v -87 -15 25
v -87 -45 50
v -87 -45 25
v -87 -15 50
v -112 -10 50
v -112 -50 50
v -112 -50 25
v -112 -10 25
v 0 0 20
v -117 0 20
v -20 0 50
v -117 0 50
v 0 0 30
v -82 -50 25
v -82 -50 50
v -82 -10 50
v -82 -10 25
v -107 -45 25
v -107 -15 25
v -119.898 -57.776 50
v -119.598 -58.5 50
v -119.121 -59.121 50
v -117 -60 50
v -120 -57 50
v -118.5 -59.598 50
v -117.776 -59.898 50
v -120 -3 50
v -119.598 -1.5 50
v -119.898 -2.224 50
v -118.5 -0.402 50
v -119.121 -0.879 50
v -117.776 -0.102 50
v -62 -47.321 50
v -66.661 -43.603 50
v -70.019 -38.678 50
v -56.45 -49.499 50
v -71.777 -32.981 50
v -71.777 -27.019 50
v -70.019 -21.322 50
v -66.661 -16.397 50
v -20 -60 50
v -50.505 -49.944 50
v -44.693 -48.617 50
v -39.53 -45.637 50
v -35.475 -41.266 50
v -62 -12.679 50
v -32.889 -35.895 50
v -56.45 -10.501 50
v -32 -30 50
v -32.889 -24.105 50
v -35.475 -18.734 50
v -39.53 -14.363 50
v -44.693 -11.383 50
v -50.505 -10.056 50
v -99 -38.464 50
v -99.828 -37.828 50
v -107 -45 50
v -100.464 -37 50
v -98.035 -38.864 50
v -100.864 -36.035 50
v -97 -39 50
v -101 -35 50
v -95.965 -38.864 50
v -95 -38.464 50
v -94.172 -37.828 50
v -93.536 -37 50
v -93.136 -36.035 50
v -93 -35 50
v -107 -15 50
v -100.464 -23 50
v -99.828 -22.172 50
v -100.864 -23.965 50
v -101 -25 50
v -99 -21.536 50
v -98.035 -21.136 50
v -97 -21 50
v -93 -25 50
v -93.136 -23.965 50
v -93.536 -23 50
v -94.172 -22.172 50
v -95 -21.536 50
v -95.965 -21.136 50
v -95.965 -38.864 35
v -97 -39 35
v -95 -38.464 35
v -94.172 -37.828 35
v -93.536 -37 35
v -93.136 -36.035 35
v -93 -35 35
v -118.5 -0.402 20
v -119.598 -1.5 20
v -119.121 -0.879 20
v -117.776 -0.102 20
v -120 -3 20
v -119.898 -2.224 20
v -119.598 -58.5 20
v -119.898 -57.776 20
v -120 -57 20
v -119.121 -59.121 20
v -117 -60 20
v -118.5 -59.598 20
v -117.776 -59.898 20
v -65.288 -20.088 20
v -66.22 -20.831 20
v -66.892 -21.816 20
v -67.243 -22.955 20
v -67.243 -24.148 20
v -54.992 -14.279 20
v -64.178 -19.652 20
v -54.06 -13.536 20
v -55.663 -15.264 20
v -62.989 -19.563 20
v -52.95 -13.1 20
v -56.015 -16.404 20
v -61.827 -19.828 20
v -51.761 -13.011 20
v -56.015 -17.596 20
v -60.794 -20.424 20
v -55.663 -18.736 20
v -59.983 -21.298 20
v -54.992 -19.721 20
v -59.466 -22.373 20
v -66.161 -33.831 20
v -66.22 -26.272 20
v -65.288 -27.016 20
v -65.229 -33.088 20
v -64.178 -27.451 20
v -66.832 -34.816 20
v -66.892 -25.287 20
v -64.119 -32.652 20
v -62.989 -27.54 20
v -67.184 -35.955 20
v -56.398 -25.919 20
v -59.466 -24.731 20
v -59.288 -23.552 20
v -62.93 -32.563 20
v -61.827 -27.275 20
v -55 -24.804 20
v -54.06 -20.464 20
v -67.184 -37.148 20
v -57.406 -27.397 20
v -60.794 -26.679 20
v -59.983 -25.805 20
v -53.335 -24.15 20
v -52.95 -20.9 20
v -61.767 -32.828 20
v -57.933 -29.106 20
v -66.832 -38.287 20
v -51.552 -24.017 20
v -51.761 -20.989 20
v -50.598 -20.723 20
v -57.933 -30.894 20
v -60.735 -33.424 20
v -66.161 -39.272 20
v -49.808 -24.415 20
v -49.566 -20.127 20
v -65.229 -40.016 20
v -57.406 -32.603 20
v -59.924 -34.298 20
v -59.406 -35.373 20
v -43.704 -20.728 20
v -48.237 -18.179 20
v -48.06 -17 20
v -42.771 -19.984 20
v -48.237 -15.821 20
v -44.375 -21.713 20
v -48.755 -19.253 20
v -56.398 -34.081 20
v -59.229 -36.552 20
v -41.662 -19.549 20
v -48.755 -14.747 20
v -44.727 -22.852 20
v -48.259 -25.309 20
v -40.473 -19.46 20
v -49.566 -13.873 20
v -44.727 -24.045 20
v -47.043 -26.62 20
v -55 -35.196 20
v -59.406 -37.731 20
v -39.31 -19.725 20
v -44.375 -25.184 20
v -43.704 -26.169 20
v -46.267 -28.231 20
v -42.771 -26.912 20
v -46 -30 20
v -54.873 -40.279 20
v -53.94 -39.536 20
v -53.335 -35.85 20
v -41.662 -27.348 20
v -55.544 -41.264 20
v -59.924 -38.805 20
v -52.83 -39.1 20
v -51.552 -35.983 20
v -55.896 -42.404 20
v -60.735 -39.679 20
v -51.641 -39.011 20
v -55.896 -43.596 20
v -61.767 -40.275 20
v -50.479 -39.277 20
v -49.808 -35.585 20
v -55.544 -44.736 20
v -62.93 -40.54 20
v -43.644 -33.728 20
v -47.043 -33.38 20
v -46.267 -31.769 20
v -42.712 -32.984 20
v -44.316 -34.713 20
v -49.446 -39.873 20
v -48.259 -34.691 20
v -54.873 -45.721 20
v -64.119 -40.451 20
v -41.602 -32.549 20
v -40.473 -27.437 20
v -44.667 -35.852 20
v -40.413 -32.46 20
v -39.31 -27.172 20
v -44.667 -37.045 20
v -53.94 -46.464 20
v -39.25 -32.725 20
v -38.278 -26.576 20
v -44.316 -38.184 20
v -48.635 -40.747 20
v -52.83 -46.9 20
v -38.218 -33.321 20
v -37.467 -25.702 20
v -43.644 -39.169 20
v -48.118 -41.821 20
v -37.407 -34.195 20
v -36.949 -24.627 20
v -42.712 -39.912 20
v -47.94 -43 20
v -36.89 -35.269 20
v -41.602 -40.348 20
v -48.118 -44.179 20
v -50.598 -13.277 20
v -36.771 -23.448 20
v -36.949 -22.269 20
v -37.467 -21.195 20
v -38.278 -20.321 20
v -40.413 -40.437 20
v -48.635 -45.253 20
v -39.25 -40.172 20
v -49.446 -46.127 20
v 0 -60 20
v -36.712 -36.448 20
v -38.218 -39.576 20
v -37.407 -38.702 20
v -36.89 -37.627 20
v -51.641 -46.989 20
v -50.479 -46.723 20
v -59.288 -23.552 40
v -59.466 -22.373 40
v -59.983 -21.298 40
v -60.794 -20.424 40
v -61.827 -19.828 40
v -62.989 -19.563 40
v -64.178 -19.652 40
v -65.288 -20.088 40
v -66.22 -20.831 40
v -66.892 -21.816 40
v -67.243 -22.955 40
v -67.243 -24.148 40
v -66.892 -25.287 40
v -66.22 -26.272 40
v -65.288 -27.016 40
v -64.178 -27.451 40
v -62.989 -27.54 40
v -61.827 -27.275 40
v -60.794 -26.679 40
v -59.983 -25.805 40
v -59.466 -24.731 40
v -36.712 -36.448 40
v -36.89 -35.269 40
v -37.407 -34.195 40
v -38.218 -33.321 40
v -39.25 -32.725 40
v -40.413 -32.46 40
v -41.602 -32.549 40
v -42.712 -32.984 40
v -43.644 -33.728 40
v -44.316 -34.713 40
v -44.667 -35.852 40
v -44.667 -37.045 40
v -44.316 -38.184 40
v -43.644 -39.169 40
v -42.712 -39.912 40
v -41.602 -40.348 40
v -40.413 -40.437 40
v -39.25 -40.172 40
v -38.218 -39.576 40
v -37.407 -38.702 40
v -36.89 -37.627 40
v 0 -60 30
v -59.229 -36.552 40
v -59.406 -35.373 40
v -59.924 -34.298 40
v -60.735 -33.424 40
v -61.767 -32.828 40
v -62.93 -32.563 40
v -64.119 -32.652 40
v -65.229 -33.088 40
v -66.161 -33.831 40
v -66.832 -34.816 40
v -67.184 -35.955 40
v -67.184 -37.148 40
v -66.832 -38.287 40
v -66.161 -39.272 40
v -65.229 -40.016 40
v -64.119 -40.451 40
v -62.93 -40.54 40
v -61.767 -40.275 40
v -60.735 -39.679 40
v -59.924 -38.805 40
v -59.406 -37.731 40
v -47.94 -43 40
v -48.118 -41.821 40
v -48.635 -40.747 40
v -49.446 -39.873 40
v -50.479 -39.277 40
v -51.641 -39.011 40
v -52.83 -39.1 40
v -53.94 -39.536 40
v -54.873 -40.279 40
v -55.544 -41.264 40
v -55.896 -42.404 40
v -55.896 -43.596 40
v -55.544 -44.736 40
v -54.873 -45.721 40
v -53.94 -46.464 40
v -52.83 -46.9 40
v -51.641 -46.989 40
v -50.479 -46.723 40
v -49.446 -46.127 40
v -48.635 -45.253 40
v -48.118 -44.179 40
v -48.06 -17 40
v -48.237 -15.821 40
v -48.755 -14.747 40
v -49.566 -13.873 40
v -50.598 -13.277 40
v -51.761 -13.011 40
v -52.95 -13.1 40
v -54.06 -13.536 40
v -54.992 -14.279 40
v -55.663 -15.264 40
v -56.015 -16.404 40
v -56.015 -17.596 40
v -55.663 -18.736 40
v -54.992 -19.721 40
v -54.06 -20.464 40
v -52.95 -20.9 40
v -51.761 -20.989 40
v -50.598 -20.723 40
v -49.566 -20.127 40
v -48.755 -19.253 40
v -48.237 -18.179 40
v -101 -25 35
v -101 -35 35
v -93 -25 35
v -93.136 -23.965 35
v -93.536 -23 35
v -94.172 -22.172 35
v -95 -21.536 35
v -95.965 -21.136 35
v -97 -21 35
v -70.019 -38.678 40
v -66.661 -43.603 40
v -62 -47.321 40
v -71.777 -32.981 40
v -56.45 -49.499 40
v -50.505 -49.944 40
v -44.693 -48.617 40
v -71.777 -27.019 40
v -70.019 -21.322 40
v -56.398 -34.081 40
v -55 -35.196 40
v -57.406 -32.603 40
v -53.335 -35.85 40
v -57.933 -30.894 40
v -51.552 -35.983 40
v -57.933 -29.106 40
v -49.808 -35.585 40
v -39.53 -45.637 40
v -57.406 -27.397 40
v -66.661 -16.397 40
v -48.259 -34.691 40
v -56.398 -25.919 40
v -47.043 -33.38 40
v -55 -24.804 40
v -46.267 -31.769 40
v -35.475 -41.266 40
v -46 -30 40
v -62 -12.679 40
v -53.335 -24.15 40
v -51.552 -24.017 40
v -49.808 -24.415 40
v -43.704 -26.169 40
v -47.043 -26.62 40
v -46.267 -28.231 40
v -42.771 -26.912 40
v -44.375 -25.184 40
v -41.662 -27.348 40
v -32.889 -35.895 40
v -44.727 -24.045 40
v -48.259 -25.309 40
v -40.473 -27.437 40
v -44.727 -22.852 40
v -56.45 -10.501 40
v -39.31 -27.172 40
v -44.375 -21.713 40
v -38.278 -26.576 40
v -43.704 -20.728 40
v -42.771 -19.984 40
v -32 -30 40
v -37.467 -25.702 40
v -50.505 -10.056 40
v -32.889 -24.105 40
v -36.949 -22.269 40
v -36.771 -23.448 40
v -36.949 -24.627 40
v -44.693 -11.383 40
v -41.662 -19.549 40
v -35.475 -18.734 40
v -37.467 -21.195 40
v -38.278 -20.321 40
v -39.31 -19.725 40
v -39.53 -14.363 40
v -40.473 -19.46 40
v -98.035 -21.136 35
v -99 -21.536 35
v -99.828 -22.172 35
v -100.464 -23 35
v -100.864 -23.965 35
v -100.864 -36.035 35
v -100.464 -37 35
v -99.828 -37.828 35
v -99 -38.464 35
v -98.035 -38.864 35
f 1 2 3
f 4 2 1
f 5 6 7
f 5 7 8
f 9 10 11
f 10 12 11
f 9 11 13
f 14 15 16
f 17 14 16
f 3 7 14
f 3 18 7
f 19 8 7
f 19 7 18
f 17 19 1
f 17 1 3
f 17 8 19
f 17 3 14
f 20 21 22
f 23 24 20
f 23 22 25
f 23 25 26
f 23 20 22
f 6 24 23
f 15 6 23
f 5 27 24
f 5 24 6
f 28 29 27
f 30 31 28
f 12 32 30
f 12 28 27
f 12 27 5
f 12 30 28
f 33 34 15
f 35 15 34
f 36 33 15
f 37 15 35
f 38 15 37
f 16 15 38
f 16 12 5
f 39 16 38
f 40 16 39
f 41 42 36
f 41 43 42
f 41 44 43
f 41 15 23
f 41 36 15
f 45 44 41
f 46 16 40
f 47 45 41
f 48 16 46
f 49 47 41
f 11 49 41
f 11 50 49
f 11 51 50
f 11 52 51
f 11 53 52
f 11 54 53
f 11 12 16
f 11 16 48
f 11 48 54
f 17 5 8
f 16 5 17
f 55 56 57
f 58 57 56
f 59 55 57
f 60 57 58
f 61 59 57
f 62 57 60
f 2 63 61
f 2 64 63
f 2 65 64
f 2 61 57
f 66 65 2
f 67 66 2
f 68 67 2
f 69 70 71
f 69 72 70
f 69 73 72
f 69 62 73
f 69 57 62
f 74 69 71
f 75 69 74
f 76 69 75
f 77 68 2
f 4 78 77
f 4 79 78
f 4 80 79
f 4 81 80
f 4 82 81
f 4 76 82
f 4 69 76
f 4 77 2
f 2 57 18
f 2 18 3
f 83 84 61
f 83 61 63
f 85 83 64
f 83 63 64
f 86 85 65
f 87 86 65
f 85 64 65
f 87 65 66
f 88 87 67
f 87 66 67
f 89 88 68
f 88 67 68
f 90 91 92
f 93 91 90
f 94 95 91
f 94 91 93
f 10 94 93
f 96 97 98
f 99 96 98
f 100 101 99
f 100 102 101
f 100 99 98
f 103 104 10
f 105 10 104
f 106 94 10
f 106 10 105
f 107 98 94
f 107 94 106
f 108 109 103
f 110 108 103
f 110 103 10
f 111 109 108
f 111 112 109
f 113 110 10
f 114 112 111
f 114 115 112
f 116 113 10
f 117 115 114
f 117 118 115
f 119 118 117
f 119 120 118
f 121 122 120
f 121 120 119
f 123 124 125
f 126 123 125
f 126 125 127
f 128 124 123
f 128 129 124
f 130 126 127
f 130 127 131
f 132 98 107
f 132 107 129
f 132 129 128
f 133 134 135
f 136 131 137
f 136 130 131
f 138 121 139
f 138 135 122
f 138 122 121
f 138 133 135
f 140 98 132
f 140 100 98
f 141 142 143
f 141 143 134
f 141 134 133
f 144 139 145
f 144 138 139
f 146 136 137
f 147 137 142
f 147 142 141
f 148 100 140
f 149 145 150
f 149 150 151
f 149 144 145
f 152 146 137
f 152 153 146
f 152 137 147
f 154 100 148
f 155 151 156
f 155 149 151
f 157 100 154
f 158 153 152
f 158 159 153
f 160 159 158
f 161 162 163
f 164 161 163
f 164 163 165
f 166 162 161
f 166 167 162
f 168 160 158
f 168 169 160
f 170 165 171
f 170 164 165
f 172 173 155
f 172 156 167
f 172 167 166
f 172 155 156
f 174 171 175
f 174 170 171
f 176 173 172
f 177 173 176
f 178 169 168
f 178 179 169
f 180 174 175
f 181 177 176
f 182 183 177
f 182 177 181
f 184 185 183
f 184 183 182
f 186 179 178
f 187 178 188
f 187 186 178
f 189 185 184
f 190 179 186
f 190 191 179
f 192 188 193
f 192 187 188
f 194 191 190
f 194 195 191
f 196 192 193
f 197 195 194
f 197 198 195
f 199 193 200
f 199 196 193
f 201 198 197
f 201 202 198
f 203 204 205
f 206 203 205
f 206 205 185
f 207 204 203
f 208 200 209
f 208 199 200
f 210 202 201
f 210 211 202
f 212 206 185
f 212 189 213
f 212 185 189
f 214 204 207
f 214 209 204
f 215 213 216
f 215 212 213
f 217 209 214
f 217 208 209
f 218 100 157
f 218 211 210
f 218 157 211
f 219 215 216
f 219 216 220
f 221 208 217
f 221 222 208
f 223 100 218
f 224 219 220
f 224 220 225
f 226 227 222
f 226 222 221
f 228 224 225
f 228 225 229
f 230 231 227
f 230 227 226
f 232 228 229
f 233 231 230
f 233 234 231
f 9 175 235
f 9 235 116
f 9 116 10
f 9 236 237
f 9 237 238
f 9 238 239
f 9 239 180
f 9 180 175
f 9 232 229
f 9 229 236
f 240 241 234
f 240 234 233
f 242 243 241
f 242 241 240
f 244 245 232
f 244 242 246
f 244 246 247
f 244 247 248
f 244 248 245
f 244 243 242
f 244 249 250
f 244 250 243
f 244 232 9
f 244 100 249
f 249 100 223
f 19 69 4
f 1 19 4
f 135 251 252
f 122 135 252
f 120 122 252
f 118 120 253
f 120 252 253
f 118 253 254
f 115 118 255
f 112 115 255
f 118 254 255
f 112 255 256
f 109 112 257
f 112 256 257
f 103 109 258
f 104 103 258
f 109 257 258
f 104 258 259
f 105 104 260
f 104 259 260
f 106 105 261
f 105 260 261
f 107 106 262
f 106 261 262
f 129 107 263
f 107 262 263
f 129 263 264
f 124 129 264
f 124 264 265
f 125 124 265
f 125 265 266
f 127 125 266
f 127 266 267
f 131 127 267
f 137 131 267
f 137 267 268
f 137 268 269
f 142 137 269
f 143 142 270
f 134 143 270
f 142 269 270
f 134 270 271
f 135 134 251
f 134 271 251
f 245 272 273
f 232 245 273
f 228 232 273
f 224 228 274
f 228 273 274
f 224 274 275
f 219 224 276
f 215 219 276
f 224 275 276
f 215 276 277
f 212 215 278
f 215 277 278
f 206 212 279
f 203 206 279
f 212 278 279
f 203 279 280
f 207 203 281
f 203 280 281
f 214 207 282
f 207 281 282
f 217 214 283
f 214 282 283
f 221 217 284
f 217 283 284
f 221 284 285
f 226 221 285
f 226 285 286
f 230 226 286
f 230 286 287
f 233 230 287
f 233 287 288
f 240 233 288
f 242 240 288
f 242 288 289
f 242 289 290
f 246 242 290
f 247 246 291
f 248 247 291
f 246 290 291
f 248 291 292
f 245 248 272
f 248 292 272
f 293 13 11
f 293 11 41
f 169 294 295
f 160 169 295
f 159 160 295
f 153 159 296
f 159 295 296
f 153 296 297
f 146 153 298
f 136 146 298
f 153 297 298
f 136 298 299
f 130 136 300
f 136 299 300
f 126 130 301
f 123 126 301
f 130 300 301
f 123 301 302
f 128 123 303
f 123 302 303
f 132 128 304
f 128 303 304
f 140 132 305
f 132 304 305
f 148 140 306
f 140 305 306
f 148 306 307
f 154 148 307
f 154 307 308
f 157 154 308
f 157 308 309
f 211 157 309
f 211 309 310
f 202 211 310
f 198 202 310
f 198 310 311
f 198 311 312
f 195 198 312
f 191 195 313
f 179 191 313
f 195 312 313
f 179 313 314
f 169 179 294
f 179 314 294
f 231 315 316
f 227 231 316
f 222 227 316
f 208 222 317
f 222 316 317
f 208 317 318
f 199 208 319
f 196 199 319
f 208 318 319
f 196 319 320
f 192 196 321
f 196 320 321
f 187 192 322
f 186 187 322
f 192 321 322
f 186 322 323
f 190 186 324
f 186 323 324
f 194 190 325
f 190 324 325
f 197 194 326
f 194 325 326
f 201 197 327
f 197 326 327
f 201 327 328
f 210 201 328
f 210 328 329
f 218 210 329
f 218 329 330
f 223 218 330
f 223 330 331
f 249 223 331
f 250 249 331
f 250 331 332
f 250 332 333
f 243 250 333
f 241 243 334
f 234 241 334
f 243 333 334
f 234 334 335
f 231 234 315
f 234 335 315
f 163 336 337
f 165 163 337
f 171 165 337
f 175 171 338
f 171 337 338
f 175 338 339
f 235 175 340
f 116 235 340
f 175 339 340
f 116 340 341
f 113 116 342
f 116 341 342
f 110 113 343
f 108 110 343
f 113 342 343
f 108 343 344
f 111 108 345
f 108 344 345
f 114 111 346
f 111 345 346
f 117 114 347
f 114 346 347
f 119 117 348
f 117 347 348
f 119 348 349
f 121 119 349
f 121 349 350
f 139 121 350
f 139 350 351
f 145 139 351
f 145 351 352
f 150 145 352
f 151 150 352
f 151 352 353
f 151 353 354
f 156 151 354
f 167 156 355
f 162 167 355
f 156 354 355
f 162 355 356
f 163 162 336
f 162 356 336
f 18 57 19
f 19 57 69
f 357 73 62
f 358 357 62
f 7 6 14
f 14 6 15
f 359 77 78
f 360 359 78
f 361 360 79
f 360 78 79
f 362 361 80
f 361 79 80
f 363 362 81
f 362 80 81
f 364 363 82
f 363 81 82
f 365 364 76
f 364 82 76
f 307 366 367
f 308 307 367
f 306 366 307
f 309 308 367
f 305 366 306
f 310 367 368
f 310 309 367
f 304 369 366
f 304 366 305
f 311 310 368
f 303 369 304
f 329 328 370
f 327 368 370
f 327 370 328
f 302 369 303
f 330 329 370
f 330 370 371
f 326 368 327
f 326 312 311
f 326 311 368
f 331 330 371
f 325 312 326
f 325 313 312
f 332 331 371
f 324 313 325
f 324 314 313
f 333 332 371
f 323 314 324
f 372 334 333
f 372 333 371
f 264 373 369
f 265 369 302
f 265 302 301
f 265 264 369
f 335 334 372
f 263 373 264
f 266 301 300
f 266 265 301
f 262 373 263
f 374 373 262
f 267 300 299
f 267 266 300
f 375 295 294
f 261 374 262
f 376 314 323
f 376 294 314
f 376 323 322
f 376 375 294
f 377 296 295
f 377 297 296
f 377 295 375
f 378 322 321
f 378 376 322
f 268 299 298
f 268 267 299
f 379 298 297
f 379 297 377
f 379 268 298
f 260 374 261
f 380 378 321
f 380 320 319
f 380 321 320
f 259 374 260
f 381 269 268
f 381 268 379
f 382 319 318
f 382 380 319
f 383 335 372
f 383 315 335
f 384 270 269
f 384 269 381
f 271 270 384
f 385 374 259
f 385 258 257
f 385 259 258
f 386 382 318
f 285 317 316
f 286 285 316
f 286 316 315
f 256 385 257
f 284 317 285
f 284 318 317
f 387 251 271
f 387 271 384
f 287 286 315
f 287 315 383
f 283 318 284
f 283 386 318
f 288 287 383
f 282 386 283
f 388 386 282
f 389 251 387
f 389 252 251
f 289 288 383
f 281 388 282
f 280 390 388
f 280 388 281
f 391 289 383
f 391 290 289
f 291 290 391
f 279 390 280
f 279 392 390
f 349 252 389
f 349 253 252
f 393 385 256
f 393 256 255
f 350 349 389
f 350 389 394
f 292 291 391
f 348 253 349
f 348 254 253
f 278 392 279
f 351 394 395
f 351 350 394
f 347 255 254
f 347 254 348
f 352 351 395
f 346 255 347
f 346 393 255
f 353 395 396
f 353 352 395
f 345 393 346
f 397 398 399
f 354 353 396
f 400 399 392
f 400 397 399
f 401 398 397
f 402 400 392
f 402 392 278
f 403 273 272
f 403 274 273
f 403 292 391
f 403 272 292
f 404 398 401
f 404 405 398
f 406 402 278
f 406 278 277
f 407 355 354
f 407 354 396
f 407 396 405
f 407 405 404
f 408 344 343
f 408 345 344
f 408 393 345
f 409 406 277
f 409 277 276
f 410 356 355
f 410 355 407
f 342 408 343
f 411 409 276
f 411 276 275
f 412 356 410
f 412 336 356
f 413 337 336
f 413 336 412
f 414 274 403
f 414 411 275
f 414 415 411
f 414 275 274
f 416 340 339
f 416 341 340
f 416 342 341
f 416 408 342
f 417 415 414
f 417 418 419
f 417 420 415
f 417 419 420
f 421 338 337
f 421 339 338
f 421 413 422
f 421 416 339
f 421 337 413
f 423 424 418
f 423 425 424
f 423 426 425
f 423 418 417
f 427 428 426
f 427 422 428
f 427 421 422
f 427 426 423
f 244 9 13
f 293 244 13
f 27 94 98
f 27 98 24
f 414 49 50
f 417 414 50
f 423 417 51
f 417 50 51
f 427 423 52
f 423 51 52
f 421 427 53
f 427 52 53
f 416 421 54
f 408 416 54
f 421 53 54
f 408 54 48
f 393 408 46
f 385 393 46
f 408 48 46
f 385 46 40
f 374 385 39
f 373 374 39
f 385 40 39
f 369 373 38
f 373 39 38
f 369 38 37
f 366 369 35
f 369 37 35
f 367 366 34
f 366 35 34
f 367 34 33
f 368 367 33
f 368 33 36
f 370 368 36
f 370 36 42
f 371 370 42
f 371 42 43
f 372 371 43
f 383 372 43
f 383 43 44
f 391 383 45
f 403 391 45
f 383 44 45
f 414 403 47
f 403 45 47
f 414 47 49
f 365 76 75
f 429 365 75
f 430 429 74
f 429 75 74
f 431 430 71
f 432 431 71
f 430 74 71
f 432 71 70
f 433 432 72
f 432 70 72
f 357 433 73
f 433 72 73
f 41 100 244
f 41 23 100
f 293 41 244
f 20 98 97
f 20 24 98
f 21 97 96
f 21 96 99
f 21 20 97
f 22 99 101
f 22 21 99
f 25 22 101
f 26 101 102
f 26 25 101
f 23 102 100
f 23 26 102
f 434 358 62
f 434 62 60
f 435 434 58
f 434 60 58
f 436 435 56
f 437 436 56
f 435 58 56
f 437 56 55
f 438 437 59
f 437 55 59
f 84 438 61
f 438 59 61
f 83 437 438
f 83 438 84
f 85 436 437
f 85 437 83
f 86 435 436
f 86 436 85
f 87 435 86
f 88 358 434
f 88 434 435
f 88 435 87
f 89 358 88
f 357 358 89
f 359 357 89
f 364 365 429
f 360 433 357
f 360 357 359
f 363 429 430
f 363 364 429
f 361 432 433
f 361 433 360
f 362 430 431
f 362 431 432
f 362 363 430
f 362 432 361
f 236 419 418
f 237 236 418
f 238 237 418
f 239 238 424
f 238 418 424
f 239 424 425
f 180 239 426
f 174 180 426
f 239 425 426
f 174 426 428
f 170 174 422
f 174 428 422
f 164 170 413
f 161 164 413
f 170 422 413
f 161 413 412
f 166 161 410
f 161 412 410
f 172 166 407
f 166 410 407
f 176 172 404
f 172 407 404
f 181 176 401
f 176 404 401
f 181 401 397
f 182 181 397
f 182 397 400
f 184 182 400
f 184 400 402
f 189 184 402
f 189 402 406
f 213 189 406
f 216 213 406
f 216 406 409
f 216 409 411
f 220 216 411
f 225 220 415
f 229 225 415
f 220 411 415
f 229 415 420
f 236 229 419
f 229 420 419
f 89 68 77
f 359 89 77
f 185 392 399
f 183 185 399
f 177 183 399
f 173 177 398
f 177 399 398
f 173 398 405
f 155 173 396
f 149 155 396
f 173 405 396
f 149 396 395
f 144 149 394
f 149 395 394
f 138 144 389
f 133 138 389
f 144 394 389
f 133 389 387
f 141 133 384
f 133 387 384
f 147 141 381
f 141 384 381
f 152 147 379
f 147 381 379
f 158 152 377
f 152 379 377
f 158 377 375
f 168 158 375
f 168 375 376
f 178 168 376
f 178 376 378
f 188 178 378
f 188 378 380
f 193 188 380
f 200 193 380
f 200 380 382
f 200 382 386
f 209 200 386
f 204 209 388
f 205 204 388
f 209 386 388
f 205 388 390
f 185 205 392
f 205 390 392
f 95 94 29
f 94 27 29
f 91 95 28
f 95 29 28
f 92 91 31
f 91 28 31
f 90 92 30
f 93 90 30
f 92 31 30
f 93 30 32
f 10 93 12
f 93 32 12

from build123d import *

# Parameters (mm, degrees)
F0_W      = 120
F0_H      = 50
F1_DEPTH  = 60
F2_W      = 30
F2_H      = 40
F2_W_2    = 20
F2_H_2    = 30
F3_DEPTH  = 25
F5_DEPTH  = 15
F7_SIZE   = 20
F8_R      = 20
F9_DEPTH  = 10
F10_R     = 4
F11_DEPTH = 20
F6_W      = 120
F6_H      = 60
F12_DEPTH = 20
F13_R     = 6
F14_DEPTH = 20
F15_R     = 3
F16_R     = 3


with BuildPart() as f1:
    # F0 (on Front) → F1 (new body)
    with BuildSketch(Plane.XZ):
        with Locations((-60, 25)):
            Rectangle(F0_W, F0_H)
    extrude(amount=F1_DEPTH)

    # F2 (on face) → F3 (cut)
    with BuildSketch(Plane.XY.offset(50)):
        with Locations((-97, -30)):
            Rectangle(F2_W, F2_H)
        with Locations((-97, -30)):
            Rectangle(F2_W_2, F2_H_2, mode=Mode.SUBTRACT)
    extrude(amount=-F3_DEPTH, mode=Mode.SUBTRACT)

    # F4 (on face) → F5 (cut)
    with BuildSketch(Plane.XY.offset(50)):
        with BuildLine():
            ThreePointArc((-97, -21), (-99.828427, -22.171573), (-101, -25))
            Line((-101, -25), (-101, -35))
            ThreePointArc((-101, -35), (-99.828427, -37.828427), (-97, -39))
            ThreePointArc((-97, -39), (-94.171573, -37.828427), (-93, -35))
            Line((-93, -35), (-93, -25))
            ThreePointArc((-93, -25), (-94.171573, -22.171573), (-97, -21))
        make_face()
    extrude(amount=-F5_DEPTH, mode=Mode.SUBTRACT)

    # F7
    f7_edges = [f1.edges().sort_by_distance(p)[0] for p in [
        (0, -30, 50),
    ]]
    chamfer(f7_edges, length=F7_SIZE)

    # F8 (on face) → F9 (cut)
    with BuildSketch(Plane.XY.offset(50)):
        with Locations((-52, -30)):
            Circle(F8_R)
    extrude(amount=-F9_DEPTH, mode=Mode.SUBTRACT)

    # F10 (on face) → F11 (cut)
    with BuildSketch(Plane.XY.offset(40)):
        with Locations((-52.059621, -17)):
            Circle(F10_R)
        with Locations((-63.288141, -23.551633)):
            Circle(F10_R)
        with Locations((-63.22852, -36.551633)):
            Circle(F10_R)
        with Locations((-51.940379, -43)):
            Circle(F10_R)
        with Locations((-40.711859, -36.448367)):
            Circle(F10_R)
        with Locations((-40.77148, -23.448367)):
            Circle(F10_R)
    extrude(amount=-F11_DEPTH, mode=Mode.SUBTRACT)

    # F6 (on face) → F12 (cut)
    with BuildSketch(Plane(origin=(0, 0, 0), x_dir=(1, 0, 0), z_dir=(0, 0, -1))):
        with Locations((-60, 30)):
            Rectangle(F6_W, F6_H)
    extrude(amount=-F12_DEPTH, mode=Mode.SUBTRACT)

    # F13 (on face) → F14 (cut)
    with BuildSketch(Plane.XY.offset(40)):
        with Locations((-52, -30)):
            Circle(F13_R)
    extrude(amount=-F14_DEPTH, mode=Mode.SUBTRACT)

    # F15
    f15_edges = [f1.edges().sort_by_distance(p)[0] for p in [
        (-120, -60, 35),
    ]]
    fillet(f15_edges, radius=F15_R)

    # F16
    f16_edges = [f1.edges().sort_by_distance(p)[0] for p in [
        (-120, 0, 35),
    ]]
    fillet(f16_edges, radius=F16_R)


solid = f1.part
